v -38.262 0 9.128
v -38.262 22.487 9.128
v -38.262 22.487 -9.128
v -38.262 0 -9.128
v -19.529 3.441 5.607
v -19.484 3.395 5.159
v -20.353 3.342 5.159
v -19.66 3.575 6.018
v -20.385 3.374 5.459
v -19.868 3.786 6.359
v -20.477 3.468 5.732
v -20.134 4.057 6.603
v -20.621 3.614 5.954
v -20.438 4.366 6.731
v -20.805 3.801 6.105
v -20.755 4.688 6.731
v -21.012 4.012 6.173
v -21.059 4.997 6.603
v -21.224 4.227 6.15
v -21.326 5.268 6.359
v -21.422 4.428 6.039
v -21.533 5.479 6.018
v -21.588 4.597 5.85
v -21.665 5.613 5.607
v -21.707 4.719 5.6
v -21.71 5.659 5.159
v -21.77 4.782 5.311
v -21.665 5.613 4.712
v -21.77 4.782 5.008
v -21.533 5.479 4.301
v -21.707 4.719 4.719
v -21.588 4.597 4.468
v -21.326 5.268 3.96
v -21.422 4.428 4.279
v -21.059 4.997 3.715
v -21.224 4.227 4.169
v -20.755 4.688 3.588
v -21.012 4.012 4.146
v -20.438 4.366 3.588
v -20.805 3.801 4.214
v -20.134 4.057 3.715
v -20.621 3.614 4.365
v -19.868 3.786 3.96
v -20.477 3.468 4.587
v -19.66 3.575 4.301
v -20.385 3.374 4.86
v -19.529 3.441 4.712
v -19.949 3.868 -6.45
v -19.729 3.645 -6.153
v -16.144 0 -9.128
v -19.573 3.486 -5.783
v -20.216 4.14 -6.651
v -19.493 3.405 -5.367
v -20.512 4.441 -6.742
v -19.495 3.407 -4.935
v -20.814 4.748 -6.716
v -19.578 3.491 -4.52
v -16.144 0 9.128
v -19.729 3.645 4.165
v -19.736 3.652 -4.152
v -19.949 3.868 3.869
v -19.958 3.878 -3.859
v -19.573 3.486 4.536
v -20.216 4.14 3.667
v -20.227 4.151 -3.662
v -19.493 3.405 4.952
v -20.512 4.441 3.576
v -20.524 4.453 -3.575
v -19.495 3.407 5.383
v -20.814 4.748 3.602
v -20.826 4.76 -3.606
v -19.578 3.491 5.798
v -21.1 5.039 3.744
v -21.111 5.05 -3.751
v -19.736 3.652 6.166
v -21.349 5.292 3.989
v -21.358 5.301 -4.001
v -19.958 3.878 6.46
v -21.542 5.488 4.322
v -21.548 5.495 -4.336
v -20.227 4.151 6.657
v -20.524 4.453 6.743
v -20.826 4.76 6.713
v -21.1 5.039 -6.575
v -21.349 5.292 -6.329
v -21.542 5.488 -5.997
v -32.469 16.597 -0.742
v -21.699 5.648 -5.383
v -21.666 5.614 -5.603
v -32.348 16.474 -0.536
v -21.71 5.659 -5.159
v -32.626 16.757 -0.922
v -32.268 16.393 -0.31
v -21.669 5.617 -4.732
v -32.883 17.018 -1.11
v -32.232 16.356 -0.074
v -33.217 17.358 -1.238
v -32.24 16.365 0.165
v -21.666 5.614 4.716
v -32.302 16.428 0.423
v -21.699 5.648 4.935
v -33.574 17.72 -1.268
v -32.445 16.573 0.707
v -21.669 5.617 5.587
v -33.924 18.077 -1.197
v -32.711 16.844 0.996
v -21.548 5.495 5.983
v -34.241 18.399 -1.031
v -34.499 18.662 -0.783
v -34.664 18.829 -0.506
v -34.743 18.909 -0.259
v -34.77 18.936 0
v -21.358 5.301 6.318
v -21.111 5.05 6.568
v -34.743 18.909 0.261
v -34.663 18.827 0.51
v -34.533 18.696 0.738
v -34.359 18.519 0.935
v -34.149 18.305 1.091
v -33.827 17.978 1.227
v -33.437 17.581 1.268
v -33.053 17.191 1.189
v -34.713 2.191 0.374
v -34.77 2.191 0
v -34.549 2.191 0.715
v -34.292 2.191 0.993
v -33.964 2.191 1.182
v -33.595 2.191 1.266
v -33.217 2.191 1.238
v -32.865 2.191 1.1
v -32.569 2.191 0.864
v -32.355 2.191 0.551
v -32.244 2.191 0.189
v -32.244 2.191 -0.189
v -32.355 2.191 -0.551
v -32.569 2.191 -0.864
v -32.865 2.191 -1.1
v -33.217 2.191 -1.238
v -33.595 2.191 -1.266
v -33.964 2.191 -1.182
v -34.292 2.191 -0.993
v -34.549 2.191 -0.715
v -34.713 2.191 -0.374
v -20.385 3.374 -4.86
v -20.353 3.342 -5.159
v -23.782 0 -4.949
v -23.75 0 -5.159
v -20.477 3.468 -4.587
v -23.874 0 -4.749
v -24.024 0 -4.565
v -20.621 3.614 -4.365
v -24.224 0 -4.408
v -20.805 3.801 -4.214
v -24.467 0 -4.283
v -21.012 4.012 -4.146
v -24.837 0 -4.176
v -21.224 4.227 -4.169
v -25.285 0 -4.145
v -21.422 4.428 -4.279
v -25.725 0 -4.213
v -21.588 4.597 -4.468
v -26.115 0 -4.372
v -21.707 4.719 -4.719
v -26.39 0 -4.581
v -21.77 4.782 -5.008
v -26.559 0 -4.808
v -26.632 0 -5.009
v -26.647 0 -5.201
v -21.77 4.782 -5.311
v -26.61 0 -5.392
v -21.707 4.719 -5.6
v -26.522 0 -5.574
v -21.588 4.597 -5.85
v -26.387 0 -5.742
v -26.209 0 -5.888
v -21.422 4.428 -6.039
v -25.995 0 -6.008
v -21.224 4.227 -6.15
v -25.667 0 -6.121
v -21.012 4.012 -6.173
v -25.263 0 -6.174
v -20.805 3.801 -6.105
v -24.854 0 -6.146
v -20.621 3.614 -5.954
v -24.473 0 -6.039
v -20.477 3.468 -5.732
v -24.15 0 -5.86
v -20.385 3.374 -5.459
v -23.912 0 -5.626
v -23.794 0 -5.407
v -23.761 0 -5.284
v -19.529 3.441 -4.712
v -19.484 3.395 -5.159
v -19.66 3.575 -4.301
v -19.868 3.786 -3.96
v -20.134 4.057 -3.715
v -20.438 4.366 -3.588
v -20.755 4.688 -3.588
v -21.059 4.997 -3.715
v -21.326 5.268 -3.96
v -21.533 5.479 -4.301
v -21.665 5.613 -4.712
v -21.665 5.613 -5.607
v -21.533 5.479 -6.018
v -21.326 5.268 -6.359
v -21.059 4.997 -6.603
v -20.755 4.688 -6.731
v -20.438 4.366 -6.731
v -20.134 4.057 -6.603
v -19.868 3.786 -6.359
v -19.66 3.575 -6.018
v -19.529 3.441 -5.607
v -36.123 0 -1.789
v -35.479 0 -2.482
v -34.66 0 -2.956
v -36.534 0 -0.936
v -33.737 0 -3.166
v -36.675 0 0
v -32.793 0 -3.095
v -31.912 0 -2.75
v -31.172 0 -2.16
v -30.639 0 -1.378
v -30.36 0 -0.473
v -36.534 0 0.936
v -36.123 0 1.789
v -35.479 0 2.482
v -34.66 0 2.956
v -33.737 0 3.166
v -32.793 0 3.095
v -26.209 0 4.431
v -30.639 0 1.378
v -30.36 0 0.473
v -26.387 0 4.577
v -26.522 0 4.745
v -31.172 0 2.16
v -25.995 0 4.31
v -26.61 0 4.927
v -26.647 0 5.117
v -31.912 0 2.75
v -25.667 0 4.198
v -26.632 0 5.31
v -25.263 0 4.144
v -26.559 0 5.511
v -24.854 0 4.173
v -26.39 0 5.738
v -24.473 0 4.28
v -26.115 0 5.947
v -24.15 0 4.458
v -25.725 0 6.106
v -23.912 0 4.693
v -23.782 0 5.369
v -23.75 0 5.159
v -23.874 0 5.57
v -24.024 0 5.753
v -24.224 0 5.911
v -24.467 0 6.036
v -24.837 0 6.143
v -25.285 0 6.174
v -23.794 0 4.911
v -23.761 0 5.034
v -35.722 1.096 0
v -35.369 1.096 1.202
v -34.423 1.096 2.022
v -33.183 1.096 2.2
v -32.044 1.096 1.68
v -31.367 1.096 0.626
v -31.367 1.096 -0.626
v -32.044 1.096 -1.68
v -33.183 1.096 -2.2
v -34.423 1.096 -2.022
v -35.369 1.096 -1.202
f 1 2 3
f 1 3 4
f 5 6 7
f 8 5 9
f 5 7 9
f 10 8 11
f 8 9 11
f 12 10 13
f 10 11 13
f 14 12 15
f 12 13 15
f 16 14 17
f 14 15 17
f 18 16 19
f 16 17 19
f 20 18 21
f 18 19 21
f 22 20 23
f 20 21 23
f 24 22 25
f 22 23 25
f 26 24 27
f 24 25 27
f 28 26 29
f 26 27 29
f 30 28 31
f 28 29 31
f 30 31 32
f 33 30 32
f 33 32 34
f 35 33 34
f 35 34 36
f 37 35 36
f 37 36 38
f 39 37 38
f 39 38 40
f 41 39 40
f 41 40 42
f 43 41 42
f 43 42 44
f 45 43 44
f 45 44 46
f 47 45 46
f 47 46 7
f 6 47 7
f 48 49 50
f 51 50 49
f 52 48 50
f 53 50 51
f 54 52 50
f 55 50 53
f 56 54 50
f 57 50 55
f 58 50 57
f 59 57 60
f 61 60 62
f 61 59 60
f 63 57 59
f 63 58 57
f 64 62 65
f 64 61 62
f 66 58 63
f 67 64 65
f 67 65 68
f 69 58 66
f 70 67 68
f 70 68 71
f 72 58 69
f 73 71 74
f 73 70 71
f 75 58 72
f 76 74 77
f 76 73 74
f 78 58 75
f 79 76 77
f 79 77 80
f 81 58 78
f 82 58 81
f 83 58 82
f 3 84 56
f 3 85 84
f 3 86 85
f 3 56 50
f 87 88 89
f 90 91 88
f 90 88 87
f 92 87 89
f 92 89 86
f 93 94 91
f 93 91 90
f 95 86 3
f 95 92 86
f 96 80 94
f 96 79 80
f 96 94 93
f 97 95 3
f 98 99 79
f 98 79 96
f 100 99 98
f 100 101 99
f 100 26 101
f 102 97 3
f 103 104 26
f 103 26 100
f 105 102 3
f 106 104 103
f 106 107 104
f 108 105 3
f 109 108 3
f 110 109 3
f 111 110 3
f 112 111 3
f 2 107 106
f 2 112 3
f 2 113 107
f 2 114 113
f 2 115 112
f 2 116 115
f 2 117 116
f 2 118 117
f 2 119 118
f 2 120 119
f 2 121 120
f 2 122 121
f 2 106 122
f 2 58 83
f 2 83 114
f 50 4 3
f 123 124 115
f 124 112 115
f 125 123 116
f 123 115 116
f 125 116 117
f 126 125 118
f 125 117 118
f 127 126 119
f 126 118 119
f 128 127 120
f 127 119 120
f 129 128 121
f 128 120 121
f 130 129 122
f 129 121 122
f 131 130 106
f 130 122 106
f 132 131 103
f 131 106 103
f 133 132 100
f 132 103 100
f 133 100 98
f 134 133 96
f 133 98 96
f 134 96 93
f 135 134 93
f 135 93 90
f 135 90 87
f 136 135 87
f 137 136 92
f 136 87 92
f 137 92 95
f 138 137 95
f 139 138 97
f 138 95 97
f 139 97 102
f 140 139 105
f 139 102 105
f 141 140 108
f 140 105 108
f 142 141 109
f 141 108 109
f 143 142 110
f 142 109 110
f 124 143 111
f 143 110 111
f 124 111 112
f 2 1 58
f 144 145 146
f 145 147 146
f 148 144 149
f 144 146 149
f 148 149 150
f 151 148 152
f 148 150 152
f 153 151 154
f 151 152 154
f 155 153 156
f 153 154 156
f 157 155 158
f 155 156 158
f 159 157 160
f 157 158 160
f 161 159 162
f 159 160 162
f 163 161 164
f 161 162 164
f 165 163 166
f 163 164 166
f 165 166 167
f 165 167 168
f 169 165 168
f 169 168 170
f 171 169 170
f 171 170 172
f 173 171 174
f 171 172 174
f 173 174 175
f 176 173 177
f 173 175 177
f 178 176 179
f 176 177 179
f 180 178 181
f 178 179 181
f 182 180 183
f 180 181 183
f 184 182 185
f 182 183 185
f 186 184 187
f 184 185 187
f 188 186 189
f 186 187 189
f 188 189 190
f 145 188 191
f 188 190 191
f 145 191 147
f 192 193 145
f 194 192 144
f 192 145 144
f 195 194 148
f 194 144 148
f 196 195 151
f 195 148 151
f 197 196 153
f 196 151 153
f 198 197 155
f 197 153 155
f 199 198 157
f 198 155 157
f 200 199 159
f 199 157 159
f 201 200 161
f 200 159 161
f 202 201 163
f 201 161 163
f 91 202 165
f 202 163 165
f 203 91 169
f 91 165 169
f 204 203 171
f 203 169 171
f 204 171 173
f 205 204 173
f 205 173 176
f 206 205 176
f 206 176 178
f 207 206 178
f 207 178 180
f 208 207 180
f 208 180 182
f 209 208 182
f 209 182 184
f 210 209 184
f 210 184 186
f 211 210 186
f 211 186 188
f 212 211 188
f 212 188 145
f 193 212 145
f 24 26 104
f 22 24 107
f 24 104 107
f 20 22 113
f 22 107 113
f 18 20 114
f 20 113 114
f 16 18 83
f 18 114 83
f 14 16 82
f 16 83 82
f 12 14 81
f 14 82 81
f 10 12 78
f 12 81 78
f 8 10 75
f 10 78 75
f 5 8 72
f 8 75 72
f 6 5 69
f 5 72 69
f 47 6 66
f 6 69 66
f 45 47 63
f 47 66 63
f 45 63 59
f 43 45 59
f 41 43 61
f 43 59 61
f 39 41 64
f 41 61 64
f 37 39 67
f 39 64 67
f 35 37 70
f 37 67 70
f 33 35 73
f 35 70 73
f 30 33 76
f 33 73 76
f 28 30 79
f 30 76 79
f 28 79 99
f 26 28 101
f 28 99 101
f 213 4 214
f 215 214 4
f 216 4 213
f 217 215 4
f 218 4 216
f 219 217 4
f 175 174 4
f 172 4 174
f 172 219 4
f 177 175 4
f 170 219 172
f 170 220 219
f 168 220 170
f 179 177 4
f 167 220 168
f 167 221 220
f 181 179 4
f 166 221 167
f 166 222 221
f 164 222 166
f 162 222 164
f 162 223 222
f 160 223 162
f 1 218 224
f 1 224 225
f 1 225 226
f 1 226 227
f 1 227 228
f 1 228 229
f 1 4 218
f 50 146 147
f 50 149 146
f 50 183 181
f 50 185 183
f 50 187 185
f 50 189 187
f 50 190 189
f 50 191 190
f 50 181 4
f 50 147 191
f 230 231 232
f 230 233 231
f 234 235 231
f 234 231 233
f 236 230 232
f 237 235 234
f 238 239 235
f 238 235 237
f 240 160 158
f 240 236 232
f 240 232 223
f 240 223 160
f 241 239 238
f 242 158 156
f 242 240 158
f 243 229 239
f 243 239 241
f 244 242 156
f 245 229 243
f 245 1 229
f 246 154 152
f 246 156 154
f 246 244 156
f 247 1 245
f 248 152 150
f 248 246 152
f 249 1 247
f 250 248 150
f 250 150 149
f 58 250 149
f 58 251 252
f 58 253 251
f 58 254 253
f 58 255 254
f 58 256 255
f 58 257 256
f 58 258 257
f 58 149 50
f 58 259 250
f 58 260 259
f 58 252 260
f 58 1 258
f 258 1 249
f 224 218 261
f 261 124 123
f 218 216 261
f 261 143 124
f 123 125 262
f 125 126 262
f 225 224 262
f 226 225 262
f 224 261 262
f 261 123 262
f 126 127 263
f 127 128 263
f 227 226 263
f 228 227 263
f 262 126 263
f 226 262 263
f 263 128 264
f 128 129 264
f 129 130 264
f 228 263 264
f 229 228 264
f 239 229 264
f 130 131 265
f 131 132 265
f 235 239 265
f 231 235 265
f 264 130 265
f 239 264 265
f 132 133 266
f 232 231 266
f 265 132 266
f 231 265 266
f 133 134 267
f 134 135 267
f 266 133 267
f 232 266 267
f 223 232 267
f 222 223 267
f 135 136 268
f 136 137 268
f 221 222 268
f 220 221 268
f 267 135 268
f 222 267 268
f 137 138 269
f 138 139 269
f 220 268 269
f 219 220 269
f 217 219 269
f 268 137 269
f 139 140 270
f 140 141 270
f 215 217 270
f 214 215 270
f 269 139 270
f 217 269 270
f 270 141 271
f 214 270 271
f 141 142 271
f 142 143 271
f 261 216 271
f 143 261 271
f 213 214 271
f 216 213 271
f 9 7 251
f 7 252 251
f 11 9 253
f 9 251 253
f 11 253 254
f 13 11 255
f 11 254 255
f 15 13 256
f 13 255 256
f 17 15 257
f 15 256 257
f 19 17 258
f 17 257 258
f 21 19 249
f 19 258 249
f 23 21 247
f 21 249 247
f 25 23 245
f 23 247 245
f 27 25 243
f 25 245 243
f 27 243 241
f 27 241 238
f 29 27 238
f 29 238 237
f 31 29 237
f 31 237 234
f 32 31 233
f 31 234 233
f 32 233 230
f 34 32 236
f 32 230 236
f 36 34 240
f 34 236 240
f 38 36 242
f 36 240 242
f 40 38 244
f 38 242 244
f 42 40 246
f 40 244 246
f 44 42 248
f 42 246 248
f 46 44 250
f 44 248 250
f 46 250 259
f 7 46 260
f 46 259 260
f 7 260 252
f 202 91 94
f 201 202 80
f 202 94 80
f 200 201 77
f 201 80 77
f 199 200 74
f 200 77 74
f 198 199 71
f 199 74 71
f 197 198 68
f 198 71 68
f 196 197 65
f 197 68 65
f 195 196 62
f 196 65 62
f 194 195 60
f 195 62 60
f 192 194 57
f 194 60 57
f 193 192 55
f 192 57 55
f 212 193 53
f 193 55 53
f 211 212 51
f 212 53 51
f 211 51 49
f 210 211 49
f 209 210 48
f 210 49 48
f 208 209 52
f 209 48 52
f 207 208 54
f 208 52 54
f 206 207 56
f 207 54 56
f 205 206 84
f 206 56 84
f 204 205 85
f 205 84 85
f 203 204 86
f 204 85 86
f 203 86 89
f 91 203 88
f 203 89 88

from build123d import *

# Parameters (mm, degrees)
F1_DEPTH       = 9.128125
F3_D           = 2.032
F3_CSINK_D     = 3.175
F3_CSINK_ANGLE = 82
F5_D           = 2.54
F5_CSINK_D     = 6.35
F5_CSINK_ANGLE = 82


with BuildPart() as f1:
    # F0 (on Top) → F1 (new body, symmetric)
    with BuildSketch(Plane.XY):
        Polygon((-16.14385, 0), (-38.262192, 22.486981), (-38.262192, 0), align=None)
    extrude(amount=F1_DEPTH, both=True)

    # F3 (through all)
    with Locations(Plane(origin=(-8.205336, -8.070822, 0), x_dir=(-0.701239, 0.712926, 0), z_dir=(0.712926, 0.701239, 0))):
        with Locations((17.670697, -5.159375), (17.670697, 5.159375)):
            CounterSinkHole(F3_D / 2, F3_CSINK_D / 2, counter_sink_angle=F3_CSINK_ANGLE)

    # F5 (through all)
    with Locations(Plane.XZ):
        with Locations((-33.499692, 0)):
            CounterSinkHole(F5_D / 2, F5_CSINK_D / 2, counter_sink_angle=F5_CSINK_ANGLE)


solid = f1.part
